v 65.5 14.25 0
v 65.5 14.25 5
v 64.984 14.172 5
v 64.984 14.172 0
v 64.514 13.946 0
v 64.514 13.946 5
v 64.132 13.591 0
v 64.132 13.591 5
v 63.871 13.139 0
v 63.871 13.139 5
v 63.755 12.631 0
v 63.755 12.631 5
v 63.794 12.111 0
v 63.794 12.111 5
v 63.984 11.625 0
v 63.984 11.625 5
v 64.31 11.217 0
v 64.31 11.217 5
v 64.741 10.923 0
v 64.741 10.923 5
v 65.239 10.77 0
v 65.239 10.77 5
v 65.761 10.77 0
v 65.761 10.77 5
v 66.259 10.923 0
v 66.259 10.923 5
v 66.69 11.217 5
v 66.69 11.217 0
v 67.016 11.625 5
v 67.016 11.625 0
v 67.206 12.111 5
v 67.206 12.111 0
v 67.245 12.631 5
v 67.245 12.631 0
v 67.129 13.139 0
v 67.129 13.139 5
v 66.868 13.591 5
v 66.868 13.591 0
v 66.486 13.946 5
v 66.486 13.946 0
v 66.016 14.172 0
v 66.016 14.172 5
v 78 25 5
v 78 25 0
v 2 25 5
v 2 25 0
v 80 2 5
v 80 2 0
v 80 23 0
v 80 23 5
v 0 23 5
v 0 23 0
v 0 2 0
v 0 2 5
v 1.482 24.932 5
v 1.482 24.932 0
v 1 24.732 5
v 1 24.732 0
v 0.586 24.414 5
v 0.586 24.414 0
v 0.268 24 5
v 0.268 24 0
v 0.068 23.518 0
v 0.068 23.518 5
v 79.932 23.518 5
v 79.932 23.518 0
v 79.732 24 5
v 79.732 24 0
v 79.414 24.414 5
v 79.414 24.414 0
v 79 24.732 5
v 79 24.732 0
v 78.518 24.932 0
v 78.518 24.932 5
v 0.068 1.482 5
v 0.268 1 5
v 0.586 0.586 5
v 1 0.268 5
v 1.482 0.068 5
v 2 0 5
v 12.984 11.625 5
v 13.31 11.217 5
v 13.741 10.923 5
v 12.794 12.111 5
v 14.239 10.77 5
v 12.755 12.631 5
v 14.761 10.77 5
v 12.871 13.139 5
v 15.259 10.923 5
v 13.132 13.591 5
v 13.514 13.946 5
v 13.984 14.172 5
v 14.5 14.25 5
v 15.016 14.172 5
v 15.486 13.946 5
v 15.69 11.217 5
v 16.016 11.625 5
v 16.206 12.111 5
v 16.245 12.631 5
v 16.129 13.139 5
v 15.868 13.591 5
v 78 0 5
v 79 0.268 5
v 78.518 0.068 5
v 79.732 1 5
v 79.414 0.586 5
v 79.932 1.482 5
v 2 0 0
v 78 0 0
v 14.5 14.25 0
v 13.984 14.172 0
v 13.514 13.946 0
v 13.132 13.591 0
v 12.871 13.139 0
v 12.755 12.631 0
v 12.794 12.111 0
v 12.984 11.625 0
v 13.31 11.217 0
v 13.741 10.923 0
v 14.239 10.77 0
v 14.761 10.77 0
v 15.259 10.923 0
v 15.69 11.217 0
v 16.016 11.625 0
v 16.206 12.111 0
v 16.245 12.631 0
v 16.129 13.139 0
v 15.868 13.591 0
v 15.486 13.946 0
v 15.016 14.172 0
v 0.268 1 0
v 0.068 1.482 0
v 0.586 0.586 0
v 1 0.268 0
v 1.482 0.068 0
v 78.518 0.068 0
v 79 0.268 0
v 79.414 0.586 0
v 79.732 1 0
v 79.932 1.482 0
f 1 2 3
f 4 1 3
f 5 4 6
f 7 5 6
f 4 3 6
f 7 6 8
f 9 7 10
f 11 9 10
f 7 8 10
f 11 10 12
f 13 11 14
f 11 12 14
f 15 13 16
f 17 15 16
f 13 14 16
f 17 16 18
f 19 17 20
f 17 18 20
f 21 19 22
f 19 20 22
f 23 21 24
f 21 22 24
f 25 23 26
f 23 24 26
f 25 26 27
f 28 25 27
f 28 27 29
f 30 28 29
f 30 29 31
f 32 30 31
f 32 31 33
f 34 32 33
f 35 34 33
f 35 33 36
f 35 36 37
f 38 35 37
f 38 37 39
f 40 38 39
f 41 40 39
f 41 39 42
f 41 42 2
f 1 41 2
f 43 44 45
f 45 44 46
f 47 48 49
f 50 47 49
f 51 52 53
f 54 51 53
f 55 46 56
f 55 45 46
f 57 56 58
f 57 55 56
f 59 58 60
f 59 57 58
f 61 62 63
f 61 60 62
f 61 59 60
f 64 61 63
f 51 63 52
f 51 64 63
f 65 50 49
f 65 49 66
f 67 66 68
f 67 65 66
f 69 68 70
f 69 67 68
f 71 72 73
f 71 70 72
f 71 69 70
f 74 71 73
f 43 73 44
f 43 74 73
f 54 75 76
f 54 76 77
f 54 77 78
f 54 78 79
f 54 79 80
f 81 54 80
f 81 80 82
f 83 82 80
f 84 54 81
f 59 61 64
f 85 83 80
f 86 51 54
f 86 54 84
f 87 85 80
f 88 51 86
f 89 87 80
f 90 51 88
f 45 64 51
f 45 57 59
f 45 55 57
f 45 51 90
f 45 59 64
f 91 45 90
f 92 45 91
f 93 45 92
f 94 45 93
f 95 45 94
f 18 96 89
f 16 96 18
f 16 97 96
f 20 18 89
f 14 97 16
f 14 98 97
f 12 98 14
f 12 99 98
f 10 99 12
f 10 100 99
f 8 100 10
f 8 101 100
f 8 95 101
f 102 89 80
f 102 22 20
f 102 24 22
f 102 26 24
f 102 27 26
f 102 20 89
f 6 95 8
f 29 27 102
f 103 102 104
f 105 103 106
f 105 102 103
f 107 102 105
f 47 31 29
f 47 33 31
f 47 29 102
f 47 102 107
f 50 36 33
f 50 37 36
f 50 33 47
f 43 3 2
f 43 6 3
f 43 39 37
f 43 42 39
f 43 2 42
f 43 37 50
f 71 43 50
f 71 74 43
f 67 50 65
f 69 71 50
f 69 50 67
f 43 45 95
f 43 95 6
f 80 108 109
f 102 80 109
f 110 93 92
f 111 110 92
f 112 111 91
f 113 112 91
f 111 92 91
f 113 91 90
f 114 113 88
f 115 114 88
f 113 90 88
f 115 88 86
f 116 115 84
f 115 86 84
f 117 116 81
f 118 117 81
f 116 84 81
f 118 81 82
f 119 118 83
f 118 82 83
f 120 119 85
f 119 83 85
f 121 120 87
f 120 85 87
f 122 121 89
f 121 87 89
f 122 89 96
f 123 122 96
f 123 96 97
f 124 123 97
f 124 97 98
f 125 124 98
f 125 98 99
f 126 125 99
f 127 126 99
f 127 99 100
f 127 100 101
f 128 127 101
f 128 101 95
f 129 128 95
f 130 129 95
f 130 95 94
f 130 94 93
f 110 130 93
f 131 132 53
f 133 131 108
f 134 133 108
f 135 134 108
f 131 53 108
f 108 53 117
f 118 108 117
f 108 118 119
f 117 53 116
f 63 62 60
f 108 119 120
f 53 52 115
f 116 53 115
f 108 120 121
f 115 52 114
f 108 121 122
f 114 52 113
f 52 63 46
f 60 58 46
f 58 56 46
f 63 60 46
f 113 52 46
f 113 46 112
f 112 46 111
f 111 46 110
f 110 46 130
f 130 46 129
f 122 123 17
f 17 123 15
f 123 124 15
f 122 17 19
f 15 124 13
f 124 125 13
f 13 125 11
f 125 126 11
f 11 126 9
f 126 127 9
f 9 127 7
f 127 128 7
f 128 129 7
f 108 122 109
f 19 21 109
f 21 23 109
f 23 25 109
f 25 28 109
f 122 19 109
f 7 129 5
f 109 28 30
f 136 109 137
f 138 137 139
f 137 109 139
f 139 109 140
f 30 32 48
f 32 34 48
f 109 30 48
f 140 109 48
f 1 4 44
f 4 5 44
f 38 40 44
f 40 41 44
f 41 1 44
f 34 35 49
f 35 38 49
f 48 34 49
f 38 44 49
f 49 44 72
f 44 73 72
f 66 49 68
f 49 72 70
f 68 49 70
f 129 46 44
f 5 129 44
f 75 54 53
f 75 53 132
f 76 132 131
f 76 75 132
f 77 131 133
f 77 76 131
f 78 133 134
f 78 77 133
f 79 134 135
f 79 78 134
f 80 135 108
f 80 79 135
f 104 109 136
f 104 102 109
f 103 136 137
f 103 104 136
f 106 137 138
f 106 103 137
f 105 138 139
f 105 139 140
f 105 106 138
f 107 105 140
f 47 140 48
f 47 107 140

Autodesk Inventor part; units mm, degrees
ref_plane "YZ Plane" through (0, 0, 0) normal (1, 0, 0) x (0, 1, 0)
ref_plane "XZ Plane" through (0, 0, 0) normal (0, 1, 0) x (-1, 0, 0)
ref_plane "XY Plane" through (0, 0, 0) normal (0, 0, 1) x (1, 0, 0)
sketch "Sketch1" plane through (0, 0, 0) normal (0, 0, 1) x (1, 0, 0)
  line L0 (0, 0) -> (80, 0)
  line L1 (80, 0) -> (80, 25)
  line L2 (80, 25) -> (0, 25)
  line L3 (0, 25) -> (0, 0)
  point P0 (14.5, 12.5)
  point P1 (65.5, 12.5)
  dimension "d0" = 80
  dimension "d1" = 25
  dimension "d2" = 12.5
  dimension "d3" = 14.5
  dimension "d4" = 51
extrude "Extrusion1" add sketch "Sketch1" along normal blind 5
sketch "Sketch2" plane through (0, 0, 0) normal (0, 0, 1) x (1, 0, 0)
  line L0 (0, 0) -> (80, 0)
  line L1 (80, 0) -> (80, 25)
  line L2 (80, 25) -> (0, 25)
  line L3 (0, 25) -> (0, 0)
  point P0 (14.5, 12.5)
  point P1 (65.5, 12.5)
  dimension "d5" = 80
  dimension "d6" = 25
  dimension "d7" = 12.5
  dimension "d8" = 14.5
  dimension "d9" = 51
hole "Hole1" at (14.5, 12.5, 0) at (65.5, 12.5, 0) direction (0, 0, 1) diameter 3.5 end through all
fillet "Fillet1" radius 2 4 edges at (0, 25, 2.5) (80, 25, 2.5) (80, 0, 2.5) (0, 0, 2.5)
sketch "Sketch3" plane through (0, 0, 5) normal (0, 0, 1) x (1, 0, 0)
  arc A0 (0, 2) -> (2, 0) centre (2, 2) ccw projected
  line L0 (2, 0) -> (78, 0) projected
  arc A1 (78, 0) -> (80, 2) centre (78, 2) ccw projected
  line L1 (80, 2) -> (80, 23) projected
  arc A2 (80, 23) -> (78, 25) centre (78, 23) ccw projected
  line L2 (78, 25) -> (2, 25) projected
  arc A3 (2, 25) -> (0, 23) centre (2, 23) ccw projected
  line L3 (0, 23) -> (0, 2) projected
  circle A4 centre (14.5, 12.5) radius 1.75 projected
  circle A5 centre (65.5, 12.5) radius 1.75 projected
  point P0 (0, 0)
properties part number "BasePatasVTOL"
